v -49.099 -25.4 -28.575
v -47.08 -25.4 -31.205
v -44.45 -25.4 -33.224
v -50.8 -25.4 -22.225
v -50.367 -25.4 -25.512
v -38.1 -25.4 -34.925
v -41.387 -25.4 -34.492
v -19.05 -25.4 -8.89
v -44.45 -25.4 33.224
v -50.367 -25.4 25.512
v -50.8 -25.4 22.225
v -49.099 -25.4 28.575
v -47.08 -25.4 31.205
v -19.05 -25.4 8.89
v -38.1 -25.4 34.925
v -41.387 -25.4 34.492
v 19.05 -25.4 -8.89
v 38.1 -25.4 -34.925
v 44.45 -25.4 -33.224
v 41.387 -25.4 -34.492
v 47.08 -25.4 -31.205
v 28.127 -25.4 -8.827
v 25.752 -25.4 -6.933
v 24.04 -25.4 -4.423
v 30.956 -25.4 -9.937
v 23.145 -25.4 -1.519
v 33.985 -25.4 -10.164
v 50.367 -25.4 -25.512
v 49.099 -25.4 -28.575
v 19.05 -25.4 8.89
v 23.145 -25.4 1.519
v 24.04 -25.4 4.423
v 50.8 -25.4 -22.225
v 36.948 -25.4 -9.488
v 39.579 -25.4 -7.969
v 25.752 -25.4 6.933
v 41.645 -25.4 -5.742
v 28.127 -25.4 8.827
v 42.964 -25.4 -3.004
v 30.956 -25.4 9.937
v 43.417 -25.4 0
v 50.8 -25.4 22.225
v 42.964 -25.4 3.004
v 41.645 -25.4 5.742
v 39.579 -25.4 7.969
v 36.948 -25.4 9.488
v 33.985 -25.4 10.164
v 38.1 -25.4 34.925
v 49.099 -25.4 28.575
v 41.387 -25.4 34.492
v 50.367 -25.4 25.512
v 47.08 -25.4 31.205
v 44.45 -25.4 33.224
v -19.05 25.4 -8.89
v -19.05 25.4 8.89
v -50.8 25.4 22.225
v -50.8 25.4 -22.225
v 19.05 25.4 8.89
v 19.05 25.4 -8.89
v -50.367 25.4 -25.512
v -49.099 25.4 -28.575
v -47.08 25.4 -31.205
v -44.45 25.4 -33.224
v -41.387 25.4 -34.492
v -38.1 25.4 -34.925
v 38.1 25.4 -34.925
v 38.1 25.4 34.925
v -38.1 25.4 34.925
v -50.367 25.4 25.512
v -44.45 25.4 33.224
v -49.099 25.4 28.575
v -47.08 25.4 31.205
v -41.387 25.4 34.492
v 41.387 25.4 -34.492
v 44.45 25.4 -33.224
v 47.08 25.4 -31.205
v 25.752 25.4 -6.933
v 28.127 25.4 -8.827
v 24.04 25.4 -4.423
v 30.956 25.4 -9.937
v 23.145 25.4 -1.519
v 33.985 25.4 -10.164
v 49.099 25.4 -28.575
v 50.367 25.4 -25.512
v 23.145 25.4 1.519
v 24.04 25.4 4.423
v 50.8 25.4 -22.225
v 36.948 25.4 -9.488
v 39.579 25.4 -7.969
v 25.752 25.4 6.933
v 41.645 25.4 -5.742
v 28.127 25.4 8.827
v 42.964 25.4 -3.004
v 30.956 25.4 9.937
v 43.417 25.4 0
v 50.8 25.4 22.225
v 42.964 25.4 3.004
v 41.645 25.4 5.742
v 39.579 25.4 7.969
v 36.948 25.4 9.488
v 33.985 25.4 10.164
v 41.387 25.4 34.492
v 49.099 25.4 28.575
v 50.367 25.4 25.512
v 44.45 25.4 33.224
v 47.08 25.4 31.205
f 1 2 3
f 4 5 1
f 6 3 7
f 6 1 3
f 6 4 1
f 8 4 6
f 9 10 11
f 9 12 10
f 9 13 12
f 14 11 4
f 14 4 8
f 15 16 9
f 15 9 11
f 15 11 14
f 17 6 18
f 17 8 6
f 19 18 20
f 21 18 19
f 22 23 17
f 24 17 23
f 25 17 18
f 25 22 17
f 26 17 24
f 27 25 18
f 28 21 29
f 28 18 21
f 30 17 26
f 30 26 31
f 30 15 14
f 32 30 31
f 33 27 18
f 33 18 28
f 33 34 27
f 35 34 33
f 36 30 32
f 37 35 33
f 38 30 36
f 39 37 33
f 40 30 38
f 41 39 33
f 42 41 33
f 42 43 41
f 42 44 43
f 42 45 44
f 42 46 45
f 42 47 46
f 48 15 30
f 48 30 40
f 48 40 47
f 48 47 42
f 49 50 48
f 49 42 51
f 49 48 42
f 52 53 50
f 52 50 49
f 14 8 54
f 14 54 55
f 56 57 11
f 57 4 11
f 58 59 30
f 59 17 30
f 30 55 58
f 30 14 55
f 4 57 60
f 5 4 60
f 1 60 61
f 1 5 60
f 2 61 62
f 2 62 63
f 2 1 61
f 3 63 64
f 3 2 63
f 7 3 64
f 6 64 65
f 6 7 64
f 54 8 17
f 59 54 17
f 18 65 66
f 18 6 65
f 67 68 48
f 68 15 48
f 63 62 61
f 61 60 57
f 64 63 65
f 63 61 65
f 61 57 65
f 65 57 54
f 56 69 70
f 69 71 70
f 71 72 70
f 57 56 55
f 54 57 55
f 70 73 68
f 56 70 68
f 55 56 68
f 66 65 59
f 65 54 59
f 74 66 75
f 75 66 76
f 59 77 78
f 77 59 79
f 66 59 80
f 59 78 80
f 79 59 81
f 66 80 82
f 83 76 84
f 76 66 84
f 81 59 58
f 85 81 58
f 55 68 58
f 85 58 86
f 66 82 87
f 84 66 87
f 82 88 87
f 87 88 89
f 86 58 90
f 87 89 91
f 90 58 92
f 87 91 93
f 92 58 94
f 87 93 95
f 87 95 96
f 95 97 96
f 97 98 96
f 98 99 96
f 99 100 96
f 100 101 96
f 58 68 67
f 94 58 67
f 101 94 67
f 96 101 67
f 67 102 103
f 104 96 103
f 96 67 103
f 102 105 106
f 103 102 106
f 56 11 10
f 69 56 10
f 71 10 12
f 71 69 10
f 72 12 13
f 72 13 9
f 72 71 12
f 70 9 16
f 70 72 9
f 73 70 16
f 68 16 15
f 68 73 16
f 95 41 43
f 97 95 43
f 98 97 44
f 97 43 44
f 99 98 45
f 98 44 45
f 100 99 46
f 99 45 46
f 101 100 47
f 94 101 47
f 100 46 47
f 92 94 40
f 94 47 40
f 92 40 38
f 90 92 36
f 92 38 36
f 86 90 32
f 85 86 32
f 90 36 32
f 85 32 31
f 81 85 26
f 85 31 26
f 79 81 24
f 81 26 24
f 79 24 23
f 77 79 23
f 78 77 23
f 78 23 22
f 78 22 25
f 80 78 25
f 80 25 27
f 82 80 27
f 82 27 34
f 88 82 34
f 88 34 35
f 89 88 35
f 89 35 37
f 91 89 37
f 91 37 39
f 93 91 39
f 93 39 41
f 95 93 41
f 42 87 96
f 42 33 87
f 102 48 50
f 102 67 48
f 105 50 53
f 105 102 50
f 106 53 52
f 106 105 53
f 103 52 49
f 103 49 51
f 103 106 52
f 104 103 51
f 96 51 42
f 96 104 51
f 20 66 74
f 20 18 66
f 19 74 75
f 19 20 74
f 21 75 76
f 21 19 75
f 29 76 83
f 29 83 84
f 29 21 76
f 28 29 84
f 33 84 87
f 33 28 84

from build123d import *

# Parameters (mm, degrees)
F0_W     = 101.6
F0_H     = 69.85
F0_W_2   = 38.1
F0_H_2   = 17.780002
F1_DEPTH = 25.4
F2_R     = 10.192823
F3_DEPTH = 50.801
F4_R     = 12.7


with BuildPart() as f1:
    # F0 (on Front) → F1 (new body, symmetric)
    with BuildSketch(Plane.XZ):
        Rectangle(F0_W, F0_H)
        Rectangle(F0_W_2, F0_H_2, mode=Mode.SUBTRACT)
    extrude(amount=F1_DEPTH, both=True)

    # F2 (on face) → F3 (cut, through all)
    with BuildSketch(Plane.XZ.offset(25.4)):
        with Locations((33.223767, 0)):
            Circle(F2_R)
    extrude(amount=-F3_DEPTH, mode=Mode.SUBTRACT)

    # F4
    f4_edges = [f1.edges().sort_by_distance(p)[0] for p in [
        (-50.8, 0, 34.925),
        (50.8, 0, 34.925),
        (50.8, 0, -34.925),
        (-50.8, 0, -34.925),
    ]]
    fillet(f4_edges, radius=F4_R)


solid = f1.part
